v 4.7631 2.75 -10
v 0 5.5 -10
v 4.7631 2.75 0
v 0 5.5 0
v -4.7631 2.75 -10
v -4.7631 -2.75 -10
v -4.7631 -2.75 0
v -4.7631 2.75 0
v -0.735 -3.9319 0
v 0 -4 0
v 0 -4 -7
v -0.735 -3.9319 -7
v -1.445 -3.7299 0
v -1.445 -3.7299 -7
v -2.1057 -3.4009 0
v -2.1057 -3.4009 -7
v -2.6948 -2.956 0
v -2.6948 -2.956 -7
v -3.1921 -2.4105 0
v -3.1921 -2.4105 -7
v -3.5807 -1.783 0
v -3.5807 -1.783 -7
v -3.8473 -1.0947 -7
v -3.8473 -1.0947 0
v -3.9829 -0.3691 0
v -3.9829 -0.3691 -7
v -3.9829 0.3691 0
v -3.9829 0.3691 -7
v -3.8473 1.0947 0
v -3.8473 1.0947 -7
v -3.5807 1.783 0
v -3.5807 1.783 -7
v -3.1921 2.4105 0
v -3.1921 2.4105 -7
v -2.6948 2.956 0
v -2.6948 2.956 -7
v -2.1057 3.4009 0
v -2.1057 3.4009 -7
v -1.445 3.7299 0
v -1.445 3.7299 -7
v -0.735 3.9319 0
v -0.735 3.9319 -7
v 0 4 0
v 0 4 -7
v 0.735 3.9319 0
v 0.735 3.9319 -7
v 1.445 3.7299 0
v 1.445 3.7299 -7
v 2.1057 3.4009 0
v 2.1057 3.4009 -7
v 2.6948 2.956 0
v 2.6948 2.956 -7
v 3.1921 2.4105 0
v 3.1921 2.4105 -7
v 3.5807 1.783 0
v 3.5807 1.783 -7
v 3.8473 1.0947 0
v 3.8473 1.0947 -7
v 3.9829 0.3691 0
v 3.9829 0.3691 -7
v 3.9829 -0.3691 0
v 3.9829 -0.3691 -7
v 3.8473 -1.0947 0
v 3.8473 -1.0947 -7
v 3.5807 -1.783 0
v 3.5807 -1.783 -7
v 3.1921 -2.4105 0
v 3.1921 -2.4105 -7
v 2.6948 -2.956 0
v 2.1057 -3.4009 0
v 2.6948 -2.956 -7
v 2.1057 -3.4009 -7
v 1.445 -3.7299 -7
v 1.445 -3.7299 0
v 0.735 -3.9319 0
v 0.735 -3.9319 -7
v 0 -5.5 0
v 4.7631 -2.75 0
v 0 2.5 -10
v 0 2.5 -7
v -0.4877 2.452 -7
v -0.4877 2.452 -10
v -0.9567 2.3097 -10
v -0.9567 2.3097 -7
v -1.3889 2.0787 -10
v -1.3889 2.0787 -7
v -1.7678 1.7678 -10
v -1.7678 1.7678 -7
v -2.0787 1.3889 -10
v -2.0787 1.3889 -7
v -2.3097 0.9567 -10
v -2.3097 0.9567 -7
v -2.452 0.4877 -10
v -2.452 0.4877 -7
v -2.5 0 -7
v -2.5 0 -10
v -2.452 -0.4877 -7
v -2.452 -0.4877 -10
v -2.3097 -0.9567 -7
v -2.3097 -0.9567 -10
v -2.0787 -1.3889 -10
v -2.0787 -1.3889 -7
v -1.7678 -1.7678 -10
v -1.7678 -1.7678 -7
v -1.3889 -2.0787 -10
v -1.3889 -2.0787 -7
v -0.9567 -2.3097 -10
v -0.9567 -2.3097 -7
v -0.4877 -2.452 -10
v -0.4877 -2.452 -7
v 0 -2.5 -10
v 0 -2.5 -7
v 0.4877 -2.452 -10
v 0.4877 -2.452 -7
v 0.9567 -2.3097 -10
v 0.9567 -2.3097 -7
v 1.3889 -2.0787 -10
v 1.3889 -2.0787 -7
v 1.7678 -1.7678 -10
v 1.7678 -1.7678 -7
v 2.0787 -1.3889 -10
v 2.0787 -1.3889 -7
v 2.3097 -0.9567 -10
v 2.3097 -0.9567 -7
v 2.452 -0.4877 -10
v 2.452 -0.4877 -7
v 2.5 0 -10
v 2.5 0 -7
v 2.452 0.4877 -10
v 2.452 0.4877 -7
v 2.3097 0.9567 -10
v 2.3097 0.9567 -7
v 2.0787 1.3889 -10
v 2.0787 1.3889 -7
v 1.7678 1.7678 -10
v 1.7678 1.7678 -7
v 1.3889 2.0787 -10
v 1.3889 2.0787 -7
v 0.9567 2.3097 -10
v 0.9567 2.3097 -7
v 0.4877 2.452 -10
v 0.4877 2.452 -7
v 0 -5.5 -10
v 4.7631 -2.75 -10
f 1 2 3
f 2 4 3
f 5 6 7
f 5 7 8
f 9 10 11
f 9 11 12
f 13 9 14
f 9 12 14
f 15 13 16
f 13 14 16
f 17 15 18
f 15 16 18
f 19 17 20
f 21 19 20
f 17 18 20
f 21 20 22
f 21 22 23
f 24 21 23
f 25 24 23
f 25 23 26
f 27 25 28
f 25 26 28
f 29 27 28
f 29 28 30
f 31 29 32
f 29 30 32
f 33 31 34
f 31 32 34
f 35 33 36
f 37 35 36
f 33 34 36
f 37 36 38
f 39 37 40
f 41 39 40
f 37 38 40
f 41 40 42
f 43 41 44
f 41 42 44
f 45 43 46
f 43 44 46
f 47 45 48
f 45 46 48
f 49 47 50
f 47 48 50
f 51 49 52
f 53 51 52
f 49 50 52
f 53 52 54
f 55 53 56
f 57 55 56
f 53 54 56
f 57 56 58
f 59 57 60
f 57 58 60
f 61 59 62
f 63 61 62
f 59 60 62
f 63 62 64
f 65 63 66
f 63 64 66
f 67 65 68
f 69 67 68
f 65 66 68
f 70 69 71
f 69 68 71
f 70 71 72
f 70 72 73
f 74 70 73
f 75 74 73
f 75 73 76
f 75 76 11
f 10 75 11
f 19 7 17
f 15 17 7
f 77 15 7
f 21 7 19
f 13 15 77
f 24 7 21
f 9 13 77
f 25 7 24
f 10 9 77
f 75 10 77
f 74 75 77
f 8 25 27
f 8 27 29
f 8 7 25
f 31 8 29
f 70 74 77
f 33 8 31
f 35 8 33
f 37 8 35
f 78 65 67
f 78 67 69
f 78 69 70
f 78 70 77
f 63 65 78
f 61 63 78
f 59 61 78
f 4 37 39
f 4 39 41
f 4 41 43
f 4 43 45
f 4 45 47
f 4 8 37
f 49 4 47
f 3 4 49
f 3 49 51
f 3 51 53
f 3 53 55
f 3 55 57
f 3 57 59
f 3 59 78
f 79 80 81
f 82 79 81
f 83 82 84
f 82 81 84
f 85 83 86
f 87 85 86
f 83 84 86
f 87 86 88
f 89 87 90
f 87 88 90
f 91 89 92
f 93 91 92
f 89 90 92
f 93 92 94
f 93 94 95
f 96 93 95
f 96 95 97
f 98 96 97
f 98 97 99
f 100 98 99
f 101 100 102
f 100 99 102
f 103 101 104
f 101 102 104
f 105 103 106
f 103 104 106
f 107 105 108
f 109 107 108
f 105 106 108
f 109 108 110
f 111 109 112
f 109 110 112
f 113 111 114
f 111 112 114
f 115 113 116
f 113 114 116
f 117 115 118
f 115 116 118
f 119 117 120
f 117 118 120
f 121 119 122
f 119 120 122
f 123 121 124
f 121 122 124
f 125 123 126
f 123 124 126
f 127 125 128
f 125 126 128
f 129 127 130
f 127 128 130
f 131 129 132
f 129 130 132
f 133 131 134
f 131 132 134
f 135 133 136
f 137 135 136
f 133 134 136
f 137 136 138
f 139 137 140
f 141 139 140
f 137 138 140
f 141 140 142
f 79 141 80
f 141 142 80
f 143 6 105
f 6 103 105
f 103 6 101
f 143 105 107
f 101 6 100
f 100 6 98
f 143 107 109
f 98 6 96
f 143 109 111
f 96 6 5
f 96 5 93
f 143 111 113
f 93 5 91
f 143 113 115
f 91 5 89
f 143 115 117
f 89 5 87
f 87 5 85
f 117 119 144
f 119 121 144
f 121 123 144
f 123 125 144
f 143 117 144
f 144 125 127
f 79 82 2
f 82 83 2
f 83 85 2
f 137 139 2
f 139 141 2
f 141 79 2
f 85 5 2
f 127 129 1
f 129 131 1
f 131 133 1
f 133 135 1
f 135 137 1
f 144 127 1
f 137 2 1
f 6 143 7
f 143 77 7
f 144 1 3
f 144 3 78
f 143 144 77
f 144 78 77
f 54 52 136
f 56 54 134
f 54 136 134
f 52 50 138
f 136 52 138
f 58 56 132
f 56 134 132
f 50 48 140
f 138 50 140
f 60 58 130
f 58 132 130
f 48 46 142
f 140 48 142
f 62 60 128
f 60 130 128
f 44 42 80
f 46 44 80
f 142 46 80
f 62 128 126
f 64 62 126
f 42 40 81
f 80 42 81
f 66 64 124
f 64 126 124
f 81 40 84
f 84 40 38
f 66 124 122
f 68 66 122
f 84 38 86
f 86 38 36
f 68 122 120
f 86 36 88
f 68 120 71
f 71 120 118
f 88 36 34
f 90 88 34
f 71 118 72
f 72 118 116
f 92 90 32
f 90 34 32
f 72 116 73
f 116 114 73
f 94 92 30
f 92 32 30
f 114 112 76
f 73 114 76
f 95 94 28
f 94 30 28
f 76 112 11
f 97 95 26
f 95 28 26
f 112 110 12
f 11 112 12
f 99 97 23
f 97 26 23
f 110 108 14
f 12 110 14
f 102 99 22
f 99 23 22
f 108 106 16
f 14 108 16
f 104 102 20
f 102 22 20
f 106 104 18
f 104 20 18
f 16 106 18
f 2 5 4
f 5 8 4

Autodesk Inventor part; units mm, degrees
ref_plane "YZ Plane" through (0, 0, 0) normal (1, 0, 0) x (0, 1, 0)
ref_plane "XZ Plane" through (0, 0, 0) normal (0, 1, 0) x (-1, 0, 0)
ref_plane "XY Plane" through (0, 0, 0) normal (0, 0, 1) x (1, 0, 0)
sketch "Sketch1" plane through (0, 0, 0) normal (0, 0, 1) x (1, 0, 0)
  line L0 (0, 5.5) -> (4.7631, 2.75)
  line L1 (4.7631, 2.75) -> (4.7631, -2.75)
  line L2 (4.7631, -2.75) -> (0, -5.5)
  line L3 (0, -5.5) -> (-4.7631, -2.75)
  line L4 (-4.7631, -2.75) -> (-4.7631, 2.75)
  line L5 (-4.7631, 2.75) -> (0, 5.5)
  point P0 (0, 0)
  point P1 (0, 0)
  dimension "d0" = 11
extrude "Extrusion1" add sketch "Sketch1" against normal blind 10
sketch "Sketch3" plane through (0, 0, 0) normal (0, 0, 1) x (1, 0, 0)
  point P0 (0, 0)
  point P1 (0, 0)
hole "Hole1" at (0, 0, 0) direction (0, 0, -1) diameter 8 depth 7
thread "Thread2" size "M8x1.25" class "6H" standard "ISO Metric profile" length 15
sketch "Sketch4" plane through (0, 0, -10) normal (0, 0, -1) x (-1, 0, 0)
  point P0 (0, 0)
  point P1 (0, 0)
hole "Hole2" at (0, 0, -10) direction (0, 0, 1) diameter 5 depth 5
properties part number "159"
